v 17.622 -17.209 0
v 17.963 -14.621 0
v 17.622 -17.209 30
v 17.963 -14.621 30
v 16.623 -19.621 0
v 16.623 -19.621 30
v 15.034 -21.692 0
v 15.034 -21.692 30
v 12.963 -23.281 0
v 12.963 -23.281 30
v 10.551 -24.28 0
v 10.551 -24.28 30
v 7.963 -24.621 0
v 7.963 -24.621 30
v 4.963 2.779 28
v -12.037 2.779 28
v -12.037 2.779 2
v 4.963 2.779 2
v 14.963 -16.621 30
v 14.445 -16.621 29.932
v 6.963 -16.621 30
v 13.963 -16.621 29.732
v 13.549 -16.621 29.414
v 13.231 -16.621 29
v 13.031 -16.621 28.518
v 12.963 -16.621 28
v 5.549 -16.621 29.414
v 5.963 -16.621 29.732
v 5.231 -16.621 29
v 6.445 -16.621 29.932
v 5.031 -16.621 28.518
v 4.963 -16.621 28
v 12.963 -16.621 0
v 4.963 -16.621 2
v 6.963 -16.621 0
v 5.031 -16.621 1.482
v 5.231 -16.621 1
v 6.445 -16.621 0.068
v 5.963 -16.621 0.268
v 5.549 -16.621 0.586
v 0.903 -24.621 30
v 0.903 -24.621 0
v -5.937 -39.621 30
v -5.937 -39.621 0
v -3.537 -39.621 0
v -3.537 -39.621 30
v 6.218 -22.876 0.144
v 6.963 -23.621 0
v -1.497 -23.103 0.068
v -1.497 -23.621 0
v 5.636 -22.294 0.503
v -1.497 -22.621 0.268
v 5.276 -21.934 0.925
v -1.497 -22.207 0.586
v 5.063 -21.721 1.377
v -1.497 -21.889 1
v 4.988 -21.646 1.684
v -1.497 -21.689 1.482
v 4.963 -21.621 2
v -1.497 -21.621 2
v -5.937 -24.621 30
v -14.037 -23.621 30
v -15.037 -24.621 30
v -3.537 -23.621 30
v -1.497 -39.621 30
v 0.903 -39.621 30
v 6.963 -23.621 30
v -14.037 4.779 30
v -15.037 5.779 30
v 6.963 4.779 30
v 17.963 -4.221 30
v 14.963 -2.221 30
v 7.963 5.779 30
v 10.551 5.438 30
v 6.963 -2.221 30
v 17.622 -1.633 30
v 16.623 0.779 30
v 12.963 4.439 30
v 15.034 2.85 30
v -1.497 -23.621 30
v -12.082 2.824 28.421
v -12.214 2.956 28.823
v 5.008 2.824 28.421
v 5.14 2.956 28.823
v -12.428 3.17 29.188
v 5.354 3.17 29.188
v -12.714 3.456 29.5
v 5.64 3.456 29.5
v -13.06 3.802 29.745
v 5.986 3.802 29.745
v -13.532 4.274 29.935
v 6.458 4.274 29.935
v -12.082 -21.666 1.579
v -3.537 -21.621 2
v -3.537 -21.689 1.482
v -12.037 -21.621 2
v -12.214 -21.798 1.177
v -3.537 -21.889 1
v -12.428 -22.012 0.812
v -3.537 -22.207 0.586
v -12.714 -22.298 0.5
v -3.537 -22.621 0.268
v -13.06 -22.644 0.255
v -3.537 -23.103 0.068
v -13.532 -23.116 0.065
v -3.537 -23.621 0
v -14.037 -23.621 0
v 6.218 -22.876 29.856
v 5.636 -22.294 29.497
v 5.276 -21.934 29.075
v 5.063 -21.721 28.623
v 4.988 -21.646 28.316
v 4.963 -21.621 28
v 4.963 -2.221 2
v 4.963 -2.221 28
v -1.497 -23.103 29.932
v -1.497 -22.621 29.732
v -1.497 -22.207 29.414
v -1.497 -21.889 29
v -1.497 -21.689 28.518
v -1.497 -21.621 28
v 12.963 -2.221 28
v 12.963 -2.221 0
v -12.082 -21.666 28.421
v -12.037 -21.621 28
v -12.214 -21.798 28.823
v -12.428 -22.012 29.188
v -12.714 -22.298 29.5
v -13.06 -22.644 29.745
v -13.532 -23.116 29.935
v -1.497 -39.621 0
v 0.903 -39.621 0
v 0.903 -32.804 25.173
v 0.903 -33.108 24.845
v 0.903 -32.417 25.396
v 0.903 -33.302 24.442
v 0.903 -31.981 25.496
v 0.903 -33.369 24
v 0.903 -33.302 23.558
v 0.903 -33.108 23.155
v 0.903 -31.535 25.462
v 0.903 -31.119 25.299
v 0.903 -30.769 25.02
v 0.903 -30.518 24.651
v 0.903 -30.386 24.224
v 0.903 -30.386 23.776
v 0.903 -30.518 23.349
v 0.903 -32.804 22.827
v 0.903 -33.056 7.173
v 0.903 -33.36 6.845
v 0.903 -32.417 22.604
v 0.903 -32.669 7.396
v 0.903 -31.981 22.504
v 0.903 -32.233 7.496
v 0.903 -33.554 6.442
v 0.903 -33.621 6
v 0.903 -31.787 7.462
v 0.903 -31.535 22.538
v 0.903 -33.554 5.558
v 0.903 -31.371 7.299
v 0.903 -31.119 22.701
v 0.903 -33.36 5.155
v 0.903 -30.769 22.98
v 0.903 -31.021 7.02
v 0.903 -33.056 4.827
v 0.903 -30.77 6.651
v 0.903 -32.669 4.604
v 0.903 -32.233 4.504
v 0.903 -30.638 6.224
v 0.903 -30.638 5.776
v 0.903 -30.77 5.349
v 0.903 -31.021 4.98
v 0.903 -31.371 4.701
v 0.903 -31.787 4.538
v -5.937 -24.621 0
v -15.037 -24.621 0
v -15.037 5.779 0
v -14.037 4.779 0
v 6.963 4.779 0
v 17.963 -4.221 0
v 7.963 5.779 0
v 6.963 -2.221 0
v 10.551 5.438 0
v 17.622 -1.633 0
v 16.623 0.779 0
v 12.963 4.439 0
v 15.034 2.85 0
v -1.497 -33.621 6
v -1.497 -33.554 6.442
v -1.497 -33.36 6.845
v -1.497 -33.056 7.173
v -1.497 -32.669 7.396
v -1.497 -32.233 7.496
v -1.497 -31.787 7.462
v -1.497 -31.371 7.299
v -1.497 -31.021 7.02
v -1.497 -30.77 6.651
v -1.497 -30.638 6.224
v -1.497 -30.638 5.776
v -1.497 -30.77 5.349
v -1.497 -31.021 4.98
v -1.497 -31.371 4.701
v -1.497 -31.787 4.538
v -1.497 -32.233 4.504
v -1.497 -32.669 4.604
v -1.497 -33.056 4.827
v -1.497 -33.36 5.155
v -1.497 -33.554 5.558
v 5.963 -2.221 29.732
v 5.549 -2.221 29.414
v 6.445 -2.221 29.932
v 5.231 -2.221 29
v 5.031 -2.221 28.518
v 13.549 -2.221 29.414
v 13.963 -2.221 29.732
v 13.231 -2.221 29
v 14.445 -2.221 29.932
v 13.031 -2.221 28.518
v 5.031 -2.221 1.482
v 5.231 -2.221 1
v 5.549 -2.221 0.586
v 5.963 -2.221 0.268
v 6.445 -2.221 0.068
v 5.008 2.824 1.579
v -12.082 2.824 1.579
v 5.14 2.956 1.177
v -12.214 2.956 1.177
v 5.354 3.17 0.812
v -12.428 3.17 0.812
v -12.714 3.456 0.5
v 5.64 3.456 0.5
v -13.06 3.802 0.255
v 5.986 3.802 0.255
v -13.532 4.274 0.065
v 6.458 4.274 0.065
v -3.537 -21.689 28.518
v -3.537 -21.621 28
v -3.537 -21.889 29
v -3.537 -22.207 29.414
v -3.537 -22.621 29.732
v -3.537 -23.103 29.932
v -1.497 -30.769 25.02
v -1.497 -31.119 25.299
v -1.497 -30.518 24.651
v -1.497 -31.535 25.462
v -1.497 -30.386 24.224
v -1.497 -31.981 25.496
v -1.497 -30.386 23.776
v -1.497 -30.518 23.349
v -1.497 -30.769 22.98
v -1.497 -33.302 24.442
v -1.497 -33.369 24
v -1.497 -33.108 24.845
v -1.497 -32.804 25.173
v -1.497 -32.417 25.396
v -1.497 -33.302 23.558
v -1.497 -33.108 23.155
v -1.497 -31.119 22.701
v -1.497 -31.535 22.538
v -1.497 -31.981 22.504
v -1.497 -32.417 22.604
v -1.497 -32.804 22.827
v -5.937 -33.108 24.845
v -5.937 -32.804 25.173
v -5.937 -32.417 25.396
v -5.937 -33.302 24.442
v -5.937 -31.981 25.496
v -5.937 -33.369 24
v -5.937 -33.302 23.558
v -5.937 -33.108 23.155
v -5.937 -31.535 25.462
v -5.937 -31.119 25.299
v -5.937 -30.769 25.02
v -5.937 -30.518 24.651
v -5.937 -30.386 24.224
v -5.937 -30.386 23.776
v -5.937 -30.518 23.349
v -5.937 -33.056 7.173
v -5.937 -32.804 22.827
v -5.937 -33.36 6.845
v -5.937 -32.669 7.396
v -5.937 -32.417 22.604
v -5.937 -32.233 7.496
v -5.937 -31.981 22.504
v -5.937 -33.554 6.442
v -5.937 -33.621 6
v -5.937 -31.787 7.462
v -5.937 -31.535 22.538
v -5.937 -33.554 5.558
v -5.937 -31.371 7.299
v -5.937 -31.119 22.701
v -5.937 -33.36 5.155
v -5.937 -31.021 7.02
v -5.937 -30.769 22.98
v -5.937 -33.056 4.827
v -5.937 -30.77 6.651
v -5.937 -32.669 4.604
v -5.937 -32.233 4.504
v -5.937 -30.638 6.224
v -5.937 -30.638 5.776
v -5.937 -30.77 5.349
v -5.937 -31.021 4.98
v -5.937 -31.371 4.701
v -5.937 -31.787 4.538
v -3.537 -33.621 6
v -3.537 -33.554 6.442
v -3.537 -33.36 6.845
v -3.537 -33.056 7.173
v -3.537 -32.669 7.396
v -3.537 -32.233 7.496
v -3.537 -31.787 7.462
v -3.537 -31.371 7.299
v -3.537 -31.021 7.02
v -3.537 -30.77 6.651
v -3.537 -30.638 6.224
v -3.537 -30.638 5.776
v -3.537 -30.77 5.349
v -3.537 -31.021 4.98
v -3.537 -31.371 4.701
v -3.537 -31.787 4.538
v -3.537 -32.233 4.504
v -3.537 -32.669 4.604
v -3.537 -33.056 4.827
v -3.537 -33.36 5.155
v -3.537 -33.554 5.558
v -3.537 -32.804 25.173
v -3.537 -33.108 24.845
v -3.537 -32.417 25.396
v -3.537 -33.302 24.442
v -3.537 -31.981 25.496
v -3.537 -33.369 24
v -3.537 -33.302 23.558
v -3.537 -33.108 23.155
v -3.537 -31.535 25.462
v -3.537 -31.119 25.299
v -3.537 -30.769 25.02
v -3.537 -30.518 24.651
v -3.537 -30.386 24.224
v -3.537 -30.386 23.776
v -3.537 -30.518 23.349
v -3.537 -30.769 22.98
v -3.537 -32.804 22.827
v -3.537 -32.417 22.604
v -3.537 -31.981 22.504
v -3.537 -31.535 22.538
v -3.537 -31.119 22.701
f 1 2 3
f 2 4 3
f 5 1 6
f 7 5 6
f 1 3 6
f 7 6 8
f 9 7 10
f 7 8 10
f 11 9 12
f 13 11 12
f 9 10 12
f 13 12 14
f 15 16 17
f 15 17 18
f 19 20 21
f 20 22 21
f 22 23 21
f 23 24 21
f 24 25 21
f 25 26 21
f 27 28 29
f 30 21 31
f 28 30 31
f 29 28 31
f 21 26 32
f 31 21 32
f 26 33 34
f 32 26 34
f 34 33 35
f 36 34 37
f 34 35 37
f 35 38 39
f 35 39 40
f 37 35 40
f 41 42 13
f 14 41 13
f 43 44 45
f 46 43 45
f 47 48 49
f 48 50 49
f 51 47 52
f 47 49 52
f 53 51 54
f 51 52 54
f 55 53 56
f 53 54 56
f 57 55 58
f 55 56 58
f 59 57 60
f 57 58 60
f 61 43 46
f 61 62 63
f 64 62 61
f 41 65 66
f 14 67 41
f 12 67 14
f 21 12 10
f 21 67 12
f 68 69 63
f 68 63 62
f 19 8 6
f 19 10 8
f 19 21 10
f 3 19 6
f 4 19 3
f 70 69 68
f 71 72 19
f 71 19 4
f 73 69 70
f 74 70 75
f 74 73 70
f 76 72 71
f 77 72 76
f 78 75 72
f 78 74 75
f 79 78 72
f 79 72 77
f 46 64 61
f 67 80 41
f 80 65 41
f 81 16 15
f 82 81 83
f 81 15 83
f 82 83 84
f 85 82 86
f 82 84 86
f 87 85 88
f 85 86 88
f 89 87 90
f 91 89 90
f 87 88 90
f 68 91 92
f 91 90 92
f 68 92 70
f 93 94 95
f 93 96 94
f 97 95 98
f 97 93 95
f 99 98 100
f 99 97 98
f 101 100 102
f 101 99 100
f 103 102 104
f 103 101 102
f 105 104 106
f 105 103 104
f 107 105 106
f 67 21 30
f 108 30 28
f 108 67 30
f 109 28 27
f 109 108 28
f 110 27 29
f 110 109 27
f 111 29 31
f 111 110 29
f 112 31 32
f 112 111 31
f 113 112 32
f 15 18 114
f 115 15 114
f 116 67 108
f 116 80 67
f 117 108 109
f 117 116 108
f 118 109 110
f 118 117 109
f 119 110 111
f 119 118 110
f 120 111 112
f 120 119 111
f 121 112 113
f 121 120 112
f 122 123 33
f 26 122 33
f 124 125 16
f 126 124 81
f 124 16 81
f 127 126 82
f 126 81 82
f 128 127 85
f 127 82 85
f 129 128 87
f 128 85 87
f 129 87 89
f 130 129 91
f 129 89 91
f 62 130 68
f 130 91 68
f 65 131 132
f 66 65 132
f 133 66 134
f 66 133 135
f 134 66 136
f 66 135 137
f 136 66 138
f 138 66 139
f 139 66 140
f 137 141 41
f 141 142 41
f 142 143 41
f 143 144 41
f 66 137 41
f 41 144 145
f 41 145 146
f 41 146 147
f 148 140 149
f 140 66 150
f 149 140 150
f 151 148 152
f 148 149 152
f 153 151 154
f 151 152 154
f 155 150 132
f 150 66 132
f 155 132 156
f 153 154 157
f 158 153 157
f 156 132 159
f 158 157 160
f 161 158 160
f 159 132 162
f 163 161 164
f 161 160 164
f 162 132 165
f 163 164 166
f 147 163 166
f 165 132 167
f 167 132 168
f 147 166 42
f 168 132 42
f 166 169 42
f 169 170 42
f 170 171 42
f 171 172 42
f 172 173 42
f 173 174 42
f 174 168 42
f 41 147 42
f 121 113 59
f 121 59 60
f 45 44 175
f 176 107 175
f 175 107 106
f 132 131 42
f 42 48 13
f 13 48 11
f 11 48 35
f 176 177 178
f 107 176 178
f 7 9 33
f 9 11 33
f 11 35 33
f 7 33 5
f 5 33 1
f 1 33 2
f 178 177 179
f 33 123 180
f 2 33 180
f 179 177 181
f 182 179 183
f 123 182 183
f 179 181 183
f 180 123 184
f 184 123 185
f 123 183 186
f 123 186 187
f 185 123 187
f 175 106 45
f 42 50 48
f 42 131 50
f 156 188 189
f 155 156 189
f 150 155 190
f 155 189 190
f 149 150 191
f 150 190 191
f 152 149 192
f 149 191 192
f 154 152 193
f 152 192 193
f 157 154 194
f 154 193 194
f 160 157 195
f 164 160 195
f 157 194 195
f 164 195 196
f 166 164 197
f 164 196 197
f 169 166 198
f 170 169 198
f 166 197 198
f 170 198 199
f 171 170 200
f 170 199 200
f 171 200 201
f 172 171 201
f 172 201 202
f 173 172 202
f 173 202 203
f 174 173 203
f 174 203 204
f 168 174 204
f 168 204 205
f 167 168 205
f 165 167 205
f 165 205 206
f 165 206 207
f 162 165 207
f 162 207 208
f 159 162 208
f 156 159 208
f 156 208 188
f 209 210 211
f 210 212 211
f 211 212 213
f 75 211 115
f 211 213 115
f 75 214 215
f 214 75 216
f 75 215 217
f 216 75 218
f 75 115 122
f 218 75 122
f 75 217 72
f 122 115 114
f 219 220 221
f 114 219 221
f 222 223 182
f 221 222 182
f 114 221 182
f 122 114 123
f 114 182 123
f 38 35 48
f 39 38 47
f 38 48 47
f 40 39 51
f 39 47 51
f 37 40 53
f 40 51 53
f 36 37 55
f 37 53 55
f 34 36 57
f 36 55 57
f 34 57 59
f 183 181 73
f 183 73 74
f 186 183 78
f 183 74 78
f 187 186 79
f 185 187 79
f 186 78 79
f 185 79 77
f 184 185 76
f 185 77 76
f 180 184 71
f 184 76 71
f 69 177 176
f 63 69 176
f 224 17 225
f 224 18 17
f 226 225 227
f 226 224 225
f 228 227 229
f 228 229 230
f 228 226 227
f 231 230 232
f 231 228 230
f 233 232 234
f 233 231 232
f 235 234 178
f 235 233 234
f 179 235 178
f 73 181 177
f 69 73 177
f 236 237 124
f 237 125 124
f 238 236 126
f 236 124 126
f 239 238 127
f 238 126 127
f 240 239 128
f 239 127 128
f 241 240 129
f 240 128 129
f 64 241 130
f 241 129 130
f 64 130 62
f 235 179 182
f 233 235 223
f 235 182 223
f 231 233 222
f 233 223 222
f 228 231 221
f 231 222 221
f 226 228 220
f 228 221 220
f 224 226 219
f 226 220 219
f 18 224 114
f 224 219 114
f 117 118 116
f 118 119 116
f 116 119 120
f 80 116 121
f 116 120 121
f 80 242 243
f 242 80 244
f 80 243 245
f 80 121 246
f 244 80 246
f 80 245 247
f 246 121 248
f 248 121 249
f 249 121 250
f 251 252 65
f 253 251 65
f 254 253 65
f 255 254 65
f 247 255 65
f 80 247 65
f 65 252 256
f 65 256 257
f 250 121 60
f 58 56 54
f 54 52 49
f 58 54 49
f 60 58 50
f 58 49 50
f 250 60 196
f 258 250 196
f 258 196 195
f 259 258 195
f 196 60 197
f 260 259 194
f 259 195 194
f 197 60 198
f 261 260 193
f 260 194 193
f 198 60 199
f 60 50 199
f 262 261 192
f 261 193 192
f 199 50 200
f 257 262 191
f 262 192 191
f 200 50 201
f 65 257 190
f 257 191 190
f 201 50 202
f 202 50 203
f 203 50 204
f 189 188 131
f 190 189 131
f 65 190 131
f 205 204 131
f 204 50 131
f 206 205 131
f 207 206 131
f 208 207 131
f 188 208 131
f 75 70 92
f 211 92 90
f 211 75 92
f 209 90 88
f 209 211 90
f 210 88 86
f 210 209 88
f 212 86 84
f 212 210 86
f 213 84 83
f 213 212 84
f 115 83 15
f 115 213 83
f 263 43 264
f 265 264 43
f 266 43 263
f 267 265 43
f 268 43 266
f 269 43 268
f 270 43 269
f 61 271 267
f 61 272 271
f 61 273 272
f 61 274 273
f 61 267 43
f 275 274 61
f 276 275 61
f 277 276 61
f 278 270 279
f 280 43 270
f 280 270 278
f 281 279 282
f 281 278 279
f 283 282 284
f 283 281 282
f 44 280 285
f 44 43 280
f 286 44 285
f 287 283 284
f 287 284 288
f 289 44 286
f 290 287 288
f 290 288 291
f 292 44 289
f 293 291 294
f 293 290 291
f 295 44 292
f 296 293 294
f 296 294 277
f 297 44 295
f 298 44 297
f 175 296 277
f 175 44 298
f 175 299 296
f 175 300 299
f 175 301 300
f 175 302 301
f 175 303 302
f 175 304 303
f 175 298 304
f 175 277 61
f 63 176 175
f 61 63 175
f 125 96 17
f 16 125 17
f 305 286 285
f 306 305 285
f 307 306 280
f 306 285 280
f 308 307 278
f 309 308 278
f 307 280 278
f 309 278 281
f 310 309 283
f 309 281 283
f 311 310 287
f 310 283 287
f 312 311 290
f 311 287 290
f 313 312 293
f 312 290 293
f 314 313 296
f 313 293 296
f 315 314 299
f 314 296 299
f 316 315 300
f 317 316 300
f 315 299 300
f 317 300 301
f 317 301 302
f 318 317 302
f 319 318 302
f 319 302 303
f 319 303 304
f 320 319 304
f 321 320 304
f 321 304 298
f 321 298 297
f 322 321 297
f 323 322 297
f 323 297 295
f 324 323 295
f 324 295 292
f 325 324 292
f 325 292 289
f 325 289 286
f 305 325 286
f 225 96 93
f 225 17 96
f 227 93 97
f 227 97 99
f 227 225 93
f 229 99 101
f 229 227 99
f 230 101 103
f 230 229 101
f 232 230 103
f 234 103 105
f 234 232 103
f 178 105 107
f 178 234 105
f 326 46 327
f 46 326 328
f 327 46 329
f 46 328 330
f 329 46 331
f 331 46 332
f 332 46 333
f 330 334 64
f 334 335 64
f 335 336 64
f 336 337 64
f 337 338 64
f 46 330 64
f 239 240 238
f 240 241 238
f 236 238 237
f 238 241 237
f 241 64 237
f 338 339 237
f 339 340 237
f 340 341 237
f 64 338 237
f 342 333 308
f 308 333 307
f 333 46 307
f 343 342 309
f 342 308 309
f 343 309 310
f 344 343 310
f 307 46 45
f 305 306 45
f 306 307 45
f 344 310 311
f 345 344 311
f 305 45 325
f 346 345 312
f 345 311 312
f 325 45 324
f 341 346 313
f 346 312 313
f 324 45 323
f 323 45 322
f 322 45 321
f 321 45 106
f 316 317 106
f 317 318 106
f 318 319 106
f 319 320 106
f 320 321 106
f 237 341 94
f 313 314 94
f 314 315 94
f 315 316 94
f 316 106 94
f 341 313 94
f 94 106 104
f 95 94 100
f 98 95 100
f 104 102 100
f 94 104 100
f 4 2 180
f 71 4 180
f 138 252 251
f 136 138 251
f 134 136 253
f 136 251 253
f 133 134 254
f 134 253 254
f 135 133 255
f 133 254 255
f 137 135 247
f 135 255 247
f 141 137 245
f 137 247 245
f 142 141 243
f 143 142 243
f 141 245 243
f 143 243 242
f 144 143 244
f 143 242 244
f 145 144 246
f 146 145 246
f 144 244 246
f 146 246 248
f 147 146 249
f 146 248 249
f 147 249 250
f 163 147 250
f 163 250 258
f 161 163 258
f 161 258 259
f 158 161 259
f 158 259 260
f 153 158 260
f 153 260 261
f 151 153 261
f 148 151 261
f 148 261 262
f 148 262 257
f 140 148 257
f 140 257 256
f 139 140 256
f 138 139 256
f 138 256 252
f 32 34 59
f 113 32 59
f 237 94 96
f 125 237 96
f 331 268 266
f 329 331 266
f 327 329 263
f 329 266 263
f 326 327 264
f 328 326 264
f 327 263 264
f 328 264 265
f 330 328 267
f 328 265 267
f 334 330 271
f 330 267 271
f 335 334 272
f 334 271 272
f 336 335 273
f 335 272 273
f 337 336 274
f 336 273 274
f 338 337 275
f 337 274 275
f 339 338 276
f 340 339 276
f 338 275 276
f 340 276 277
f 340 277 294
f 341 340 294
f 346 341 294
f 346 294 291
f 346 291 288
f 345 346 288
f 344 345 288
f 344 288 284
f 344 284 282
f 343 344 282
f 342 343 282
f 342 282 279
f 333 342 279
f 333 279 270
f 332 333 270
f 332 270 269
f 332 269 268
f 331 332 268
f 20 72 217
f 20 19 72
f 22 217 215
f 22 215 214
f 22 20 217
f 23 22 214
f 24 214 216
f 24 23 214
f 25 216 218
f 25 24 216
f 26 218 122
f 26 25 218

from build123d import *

# Parameters (mm, degrees)
F0_W     = 2.4
F0_H     = 3
F0_H_2   = 15
F1_DEPTH = 30
F2_R     = 1.5
F3_DEPTH = 25
F4_R     = 2
F5_R     = 10


with BuildPart() as f1:
    # F0 (on Top) → F1 (new body)
    with BuildSketch(Plane.XY):
        Polygon((-12.036903, -21.621074), (-12.036903, 2.778926), (4.963097, 2.778926), (4.963097, -2.221074), (12.963097, -2.221074), (12.963097, -16.621074), (4.963097, -16.621074), (4.963097, -21.621074), (0.903097, -21.621074), (0.903097, -24.621074), (17.963097, -24.621074), (17.963097, 5.778926), (-15.036903, 5.778926), (-15.036903, -24.621074), (-5.936903, -24.621074), (-5.936903, -21.621074), align=None)
        with Locations((-0.296903, -23.121074)):
            Rectangle(F0_W, F0_H)
        with Locations((-0.296903, -32.121074)):
            Rectangle(F0_W, F0_H_2)
        with Locations((-4.736903, -23.121074)):
            Rectangle(F0_W, F0_H)
        with Locations((-4.736903, -32.121074)):
            Rectangle(F0_W, F0_H_2)
    extrude(amount=F1_DEPTH)

    # F2 (on face) → F3 (cut)
    with BuildSketch(Plane(origin=(-5.936903, 0, 0), x_dir=(0, -1, 0), z_dir=(-1, 0, 0))):
        with Locations((32.121074, 6)):
            Circle(F2_R)
        with Locations((31.869072, 24)):
            Circle(F2_R)
    extrude(amount=-F3_DEPTH, mode=Mode.SUBTRACT)

    # F4
    f4_edges = [f1.edges().sort_by_distance(p)[0] for p in [
        (-12.036903, -9.421074, 30),
        (-3.536903, 2.778926, 30),
        (4.963097, 0.278926, 30),
        (4.963097, -19.121074, 30),
        (1.733097, -21.621074, 30),
        (-7.786903, -21.621074, 30),
        (12.963097, -9.421074, 30),
        (-3.536903, 2.778926, 0),
        (-12.036903, -9.421074, 0),
        (-7.786903, -21.621074, 0),
        (1.733097, -21.621074, 0),
        (4.963097, -19.121074, 0),
        (4.963097, 0.278926, 0),
    ]]
    fillet(f4_edges, radius=F4_R)

    # F5
    f5_edges = [f1.edges().sort_by_distance(p)[0] for p in [
        (17.963097, 5.778926, 15),
        (17.963097, -24.621074, 15),
    ]]
    fillet(f5_edges, radius=F5_R)


solid = f1.part
